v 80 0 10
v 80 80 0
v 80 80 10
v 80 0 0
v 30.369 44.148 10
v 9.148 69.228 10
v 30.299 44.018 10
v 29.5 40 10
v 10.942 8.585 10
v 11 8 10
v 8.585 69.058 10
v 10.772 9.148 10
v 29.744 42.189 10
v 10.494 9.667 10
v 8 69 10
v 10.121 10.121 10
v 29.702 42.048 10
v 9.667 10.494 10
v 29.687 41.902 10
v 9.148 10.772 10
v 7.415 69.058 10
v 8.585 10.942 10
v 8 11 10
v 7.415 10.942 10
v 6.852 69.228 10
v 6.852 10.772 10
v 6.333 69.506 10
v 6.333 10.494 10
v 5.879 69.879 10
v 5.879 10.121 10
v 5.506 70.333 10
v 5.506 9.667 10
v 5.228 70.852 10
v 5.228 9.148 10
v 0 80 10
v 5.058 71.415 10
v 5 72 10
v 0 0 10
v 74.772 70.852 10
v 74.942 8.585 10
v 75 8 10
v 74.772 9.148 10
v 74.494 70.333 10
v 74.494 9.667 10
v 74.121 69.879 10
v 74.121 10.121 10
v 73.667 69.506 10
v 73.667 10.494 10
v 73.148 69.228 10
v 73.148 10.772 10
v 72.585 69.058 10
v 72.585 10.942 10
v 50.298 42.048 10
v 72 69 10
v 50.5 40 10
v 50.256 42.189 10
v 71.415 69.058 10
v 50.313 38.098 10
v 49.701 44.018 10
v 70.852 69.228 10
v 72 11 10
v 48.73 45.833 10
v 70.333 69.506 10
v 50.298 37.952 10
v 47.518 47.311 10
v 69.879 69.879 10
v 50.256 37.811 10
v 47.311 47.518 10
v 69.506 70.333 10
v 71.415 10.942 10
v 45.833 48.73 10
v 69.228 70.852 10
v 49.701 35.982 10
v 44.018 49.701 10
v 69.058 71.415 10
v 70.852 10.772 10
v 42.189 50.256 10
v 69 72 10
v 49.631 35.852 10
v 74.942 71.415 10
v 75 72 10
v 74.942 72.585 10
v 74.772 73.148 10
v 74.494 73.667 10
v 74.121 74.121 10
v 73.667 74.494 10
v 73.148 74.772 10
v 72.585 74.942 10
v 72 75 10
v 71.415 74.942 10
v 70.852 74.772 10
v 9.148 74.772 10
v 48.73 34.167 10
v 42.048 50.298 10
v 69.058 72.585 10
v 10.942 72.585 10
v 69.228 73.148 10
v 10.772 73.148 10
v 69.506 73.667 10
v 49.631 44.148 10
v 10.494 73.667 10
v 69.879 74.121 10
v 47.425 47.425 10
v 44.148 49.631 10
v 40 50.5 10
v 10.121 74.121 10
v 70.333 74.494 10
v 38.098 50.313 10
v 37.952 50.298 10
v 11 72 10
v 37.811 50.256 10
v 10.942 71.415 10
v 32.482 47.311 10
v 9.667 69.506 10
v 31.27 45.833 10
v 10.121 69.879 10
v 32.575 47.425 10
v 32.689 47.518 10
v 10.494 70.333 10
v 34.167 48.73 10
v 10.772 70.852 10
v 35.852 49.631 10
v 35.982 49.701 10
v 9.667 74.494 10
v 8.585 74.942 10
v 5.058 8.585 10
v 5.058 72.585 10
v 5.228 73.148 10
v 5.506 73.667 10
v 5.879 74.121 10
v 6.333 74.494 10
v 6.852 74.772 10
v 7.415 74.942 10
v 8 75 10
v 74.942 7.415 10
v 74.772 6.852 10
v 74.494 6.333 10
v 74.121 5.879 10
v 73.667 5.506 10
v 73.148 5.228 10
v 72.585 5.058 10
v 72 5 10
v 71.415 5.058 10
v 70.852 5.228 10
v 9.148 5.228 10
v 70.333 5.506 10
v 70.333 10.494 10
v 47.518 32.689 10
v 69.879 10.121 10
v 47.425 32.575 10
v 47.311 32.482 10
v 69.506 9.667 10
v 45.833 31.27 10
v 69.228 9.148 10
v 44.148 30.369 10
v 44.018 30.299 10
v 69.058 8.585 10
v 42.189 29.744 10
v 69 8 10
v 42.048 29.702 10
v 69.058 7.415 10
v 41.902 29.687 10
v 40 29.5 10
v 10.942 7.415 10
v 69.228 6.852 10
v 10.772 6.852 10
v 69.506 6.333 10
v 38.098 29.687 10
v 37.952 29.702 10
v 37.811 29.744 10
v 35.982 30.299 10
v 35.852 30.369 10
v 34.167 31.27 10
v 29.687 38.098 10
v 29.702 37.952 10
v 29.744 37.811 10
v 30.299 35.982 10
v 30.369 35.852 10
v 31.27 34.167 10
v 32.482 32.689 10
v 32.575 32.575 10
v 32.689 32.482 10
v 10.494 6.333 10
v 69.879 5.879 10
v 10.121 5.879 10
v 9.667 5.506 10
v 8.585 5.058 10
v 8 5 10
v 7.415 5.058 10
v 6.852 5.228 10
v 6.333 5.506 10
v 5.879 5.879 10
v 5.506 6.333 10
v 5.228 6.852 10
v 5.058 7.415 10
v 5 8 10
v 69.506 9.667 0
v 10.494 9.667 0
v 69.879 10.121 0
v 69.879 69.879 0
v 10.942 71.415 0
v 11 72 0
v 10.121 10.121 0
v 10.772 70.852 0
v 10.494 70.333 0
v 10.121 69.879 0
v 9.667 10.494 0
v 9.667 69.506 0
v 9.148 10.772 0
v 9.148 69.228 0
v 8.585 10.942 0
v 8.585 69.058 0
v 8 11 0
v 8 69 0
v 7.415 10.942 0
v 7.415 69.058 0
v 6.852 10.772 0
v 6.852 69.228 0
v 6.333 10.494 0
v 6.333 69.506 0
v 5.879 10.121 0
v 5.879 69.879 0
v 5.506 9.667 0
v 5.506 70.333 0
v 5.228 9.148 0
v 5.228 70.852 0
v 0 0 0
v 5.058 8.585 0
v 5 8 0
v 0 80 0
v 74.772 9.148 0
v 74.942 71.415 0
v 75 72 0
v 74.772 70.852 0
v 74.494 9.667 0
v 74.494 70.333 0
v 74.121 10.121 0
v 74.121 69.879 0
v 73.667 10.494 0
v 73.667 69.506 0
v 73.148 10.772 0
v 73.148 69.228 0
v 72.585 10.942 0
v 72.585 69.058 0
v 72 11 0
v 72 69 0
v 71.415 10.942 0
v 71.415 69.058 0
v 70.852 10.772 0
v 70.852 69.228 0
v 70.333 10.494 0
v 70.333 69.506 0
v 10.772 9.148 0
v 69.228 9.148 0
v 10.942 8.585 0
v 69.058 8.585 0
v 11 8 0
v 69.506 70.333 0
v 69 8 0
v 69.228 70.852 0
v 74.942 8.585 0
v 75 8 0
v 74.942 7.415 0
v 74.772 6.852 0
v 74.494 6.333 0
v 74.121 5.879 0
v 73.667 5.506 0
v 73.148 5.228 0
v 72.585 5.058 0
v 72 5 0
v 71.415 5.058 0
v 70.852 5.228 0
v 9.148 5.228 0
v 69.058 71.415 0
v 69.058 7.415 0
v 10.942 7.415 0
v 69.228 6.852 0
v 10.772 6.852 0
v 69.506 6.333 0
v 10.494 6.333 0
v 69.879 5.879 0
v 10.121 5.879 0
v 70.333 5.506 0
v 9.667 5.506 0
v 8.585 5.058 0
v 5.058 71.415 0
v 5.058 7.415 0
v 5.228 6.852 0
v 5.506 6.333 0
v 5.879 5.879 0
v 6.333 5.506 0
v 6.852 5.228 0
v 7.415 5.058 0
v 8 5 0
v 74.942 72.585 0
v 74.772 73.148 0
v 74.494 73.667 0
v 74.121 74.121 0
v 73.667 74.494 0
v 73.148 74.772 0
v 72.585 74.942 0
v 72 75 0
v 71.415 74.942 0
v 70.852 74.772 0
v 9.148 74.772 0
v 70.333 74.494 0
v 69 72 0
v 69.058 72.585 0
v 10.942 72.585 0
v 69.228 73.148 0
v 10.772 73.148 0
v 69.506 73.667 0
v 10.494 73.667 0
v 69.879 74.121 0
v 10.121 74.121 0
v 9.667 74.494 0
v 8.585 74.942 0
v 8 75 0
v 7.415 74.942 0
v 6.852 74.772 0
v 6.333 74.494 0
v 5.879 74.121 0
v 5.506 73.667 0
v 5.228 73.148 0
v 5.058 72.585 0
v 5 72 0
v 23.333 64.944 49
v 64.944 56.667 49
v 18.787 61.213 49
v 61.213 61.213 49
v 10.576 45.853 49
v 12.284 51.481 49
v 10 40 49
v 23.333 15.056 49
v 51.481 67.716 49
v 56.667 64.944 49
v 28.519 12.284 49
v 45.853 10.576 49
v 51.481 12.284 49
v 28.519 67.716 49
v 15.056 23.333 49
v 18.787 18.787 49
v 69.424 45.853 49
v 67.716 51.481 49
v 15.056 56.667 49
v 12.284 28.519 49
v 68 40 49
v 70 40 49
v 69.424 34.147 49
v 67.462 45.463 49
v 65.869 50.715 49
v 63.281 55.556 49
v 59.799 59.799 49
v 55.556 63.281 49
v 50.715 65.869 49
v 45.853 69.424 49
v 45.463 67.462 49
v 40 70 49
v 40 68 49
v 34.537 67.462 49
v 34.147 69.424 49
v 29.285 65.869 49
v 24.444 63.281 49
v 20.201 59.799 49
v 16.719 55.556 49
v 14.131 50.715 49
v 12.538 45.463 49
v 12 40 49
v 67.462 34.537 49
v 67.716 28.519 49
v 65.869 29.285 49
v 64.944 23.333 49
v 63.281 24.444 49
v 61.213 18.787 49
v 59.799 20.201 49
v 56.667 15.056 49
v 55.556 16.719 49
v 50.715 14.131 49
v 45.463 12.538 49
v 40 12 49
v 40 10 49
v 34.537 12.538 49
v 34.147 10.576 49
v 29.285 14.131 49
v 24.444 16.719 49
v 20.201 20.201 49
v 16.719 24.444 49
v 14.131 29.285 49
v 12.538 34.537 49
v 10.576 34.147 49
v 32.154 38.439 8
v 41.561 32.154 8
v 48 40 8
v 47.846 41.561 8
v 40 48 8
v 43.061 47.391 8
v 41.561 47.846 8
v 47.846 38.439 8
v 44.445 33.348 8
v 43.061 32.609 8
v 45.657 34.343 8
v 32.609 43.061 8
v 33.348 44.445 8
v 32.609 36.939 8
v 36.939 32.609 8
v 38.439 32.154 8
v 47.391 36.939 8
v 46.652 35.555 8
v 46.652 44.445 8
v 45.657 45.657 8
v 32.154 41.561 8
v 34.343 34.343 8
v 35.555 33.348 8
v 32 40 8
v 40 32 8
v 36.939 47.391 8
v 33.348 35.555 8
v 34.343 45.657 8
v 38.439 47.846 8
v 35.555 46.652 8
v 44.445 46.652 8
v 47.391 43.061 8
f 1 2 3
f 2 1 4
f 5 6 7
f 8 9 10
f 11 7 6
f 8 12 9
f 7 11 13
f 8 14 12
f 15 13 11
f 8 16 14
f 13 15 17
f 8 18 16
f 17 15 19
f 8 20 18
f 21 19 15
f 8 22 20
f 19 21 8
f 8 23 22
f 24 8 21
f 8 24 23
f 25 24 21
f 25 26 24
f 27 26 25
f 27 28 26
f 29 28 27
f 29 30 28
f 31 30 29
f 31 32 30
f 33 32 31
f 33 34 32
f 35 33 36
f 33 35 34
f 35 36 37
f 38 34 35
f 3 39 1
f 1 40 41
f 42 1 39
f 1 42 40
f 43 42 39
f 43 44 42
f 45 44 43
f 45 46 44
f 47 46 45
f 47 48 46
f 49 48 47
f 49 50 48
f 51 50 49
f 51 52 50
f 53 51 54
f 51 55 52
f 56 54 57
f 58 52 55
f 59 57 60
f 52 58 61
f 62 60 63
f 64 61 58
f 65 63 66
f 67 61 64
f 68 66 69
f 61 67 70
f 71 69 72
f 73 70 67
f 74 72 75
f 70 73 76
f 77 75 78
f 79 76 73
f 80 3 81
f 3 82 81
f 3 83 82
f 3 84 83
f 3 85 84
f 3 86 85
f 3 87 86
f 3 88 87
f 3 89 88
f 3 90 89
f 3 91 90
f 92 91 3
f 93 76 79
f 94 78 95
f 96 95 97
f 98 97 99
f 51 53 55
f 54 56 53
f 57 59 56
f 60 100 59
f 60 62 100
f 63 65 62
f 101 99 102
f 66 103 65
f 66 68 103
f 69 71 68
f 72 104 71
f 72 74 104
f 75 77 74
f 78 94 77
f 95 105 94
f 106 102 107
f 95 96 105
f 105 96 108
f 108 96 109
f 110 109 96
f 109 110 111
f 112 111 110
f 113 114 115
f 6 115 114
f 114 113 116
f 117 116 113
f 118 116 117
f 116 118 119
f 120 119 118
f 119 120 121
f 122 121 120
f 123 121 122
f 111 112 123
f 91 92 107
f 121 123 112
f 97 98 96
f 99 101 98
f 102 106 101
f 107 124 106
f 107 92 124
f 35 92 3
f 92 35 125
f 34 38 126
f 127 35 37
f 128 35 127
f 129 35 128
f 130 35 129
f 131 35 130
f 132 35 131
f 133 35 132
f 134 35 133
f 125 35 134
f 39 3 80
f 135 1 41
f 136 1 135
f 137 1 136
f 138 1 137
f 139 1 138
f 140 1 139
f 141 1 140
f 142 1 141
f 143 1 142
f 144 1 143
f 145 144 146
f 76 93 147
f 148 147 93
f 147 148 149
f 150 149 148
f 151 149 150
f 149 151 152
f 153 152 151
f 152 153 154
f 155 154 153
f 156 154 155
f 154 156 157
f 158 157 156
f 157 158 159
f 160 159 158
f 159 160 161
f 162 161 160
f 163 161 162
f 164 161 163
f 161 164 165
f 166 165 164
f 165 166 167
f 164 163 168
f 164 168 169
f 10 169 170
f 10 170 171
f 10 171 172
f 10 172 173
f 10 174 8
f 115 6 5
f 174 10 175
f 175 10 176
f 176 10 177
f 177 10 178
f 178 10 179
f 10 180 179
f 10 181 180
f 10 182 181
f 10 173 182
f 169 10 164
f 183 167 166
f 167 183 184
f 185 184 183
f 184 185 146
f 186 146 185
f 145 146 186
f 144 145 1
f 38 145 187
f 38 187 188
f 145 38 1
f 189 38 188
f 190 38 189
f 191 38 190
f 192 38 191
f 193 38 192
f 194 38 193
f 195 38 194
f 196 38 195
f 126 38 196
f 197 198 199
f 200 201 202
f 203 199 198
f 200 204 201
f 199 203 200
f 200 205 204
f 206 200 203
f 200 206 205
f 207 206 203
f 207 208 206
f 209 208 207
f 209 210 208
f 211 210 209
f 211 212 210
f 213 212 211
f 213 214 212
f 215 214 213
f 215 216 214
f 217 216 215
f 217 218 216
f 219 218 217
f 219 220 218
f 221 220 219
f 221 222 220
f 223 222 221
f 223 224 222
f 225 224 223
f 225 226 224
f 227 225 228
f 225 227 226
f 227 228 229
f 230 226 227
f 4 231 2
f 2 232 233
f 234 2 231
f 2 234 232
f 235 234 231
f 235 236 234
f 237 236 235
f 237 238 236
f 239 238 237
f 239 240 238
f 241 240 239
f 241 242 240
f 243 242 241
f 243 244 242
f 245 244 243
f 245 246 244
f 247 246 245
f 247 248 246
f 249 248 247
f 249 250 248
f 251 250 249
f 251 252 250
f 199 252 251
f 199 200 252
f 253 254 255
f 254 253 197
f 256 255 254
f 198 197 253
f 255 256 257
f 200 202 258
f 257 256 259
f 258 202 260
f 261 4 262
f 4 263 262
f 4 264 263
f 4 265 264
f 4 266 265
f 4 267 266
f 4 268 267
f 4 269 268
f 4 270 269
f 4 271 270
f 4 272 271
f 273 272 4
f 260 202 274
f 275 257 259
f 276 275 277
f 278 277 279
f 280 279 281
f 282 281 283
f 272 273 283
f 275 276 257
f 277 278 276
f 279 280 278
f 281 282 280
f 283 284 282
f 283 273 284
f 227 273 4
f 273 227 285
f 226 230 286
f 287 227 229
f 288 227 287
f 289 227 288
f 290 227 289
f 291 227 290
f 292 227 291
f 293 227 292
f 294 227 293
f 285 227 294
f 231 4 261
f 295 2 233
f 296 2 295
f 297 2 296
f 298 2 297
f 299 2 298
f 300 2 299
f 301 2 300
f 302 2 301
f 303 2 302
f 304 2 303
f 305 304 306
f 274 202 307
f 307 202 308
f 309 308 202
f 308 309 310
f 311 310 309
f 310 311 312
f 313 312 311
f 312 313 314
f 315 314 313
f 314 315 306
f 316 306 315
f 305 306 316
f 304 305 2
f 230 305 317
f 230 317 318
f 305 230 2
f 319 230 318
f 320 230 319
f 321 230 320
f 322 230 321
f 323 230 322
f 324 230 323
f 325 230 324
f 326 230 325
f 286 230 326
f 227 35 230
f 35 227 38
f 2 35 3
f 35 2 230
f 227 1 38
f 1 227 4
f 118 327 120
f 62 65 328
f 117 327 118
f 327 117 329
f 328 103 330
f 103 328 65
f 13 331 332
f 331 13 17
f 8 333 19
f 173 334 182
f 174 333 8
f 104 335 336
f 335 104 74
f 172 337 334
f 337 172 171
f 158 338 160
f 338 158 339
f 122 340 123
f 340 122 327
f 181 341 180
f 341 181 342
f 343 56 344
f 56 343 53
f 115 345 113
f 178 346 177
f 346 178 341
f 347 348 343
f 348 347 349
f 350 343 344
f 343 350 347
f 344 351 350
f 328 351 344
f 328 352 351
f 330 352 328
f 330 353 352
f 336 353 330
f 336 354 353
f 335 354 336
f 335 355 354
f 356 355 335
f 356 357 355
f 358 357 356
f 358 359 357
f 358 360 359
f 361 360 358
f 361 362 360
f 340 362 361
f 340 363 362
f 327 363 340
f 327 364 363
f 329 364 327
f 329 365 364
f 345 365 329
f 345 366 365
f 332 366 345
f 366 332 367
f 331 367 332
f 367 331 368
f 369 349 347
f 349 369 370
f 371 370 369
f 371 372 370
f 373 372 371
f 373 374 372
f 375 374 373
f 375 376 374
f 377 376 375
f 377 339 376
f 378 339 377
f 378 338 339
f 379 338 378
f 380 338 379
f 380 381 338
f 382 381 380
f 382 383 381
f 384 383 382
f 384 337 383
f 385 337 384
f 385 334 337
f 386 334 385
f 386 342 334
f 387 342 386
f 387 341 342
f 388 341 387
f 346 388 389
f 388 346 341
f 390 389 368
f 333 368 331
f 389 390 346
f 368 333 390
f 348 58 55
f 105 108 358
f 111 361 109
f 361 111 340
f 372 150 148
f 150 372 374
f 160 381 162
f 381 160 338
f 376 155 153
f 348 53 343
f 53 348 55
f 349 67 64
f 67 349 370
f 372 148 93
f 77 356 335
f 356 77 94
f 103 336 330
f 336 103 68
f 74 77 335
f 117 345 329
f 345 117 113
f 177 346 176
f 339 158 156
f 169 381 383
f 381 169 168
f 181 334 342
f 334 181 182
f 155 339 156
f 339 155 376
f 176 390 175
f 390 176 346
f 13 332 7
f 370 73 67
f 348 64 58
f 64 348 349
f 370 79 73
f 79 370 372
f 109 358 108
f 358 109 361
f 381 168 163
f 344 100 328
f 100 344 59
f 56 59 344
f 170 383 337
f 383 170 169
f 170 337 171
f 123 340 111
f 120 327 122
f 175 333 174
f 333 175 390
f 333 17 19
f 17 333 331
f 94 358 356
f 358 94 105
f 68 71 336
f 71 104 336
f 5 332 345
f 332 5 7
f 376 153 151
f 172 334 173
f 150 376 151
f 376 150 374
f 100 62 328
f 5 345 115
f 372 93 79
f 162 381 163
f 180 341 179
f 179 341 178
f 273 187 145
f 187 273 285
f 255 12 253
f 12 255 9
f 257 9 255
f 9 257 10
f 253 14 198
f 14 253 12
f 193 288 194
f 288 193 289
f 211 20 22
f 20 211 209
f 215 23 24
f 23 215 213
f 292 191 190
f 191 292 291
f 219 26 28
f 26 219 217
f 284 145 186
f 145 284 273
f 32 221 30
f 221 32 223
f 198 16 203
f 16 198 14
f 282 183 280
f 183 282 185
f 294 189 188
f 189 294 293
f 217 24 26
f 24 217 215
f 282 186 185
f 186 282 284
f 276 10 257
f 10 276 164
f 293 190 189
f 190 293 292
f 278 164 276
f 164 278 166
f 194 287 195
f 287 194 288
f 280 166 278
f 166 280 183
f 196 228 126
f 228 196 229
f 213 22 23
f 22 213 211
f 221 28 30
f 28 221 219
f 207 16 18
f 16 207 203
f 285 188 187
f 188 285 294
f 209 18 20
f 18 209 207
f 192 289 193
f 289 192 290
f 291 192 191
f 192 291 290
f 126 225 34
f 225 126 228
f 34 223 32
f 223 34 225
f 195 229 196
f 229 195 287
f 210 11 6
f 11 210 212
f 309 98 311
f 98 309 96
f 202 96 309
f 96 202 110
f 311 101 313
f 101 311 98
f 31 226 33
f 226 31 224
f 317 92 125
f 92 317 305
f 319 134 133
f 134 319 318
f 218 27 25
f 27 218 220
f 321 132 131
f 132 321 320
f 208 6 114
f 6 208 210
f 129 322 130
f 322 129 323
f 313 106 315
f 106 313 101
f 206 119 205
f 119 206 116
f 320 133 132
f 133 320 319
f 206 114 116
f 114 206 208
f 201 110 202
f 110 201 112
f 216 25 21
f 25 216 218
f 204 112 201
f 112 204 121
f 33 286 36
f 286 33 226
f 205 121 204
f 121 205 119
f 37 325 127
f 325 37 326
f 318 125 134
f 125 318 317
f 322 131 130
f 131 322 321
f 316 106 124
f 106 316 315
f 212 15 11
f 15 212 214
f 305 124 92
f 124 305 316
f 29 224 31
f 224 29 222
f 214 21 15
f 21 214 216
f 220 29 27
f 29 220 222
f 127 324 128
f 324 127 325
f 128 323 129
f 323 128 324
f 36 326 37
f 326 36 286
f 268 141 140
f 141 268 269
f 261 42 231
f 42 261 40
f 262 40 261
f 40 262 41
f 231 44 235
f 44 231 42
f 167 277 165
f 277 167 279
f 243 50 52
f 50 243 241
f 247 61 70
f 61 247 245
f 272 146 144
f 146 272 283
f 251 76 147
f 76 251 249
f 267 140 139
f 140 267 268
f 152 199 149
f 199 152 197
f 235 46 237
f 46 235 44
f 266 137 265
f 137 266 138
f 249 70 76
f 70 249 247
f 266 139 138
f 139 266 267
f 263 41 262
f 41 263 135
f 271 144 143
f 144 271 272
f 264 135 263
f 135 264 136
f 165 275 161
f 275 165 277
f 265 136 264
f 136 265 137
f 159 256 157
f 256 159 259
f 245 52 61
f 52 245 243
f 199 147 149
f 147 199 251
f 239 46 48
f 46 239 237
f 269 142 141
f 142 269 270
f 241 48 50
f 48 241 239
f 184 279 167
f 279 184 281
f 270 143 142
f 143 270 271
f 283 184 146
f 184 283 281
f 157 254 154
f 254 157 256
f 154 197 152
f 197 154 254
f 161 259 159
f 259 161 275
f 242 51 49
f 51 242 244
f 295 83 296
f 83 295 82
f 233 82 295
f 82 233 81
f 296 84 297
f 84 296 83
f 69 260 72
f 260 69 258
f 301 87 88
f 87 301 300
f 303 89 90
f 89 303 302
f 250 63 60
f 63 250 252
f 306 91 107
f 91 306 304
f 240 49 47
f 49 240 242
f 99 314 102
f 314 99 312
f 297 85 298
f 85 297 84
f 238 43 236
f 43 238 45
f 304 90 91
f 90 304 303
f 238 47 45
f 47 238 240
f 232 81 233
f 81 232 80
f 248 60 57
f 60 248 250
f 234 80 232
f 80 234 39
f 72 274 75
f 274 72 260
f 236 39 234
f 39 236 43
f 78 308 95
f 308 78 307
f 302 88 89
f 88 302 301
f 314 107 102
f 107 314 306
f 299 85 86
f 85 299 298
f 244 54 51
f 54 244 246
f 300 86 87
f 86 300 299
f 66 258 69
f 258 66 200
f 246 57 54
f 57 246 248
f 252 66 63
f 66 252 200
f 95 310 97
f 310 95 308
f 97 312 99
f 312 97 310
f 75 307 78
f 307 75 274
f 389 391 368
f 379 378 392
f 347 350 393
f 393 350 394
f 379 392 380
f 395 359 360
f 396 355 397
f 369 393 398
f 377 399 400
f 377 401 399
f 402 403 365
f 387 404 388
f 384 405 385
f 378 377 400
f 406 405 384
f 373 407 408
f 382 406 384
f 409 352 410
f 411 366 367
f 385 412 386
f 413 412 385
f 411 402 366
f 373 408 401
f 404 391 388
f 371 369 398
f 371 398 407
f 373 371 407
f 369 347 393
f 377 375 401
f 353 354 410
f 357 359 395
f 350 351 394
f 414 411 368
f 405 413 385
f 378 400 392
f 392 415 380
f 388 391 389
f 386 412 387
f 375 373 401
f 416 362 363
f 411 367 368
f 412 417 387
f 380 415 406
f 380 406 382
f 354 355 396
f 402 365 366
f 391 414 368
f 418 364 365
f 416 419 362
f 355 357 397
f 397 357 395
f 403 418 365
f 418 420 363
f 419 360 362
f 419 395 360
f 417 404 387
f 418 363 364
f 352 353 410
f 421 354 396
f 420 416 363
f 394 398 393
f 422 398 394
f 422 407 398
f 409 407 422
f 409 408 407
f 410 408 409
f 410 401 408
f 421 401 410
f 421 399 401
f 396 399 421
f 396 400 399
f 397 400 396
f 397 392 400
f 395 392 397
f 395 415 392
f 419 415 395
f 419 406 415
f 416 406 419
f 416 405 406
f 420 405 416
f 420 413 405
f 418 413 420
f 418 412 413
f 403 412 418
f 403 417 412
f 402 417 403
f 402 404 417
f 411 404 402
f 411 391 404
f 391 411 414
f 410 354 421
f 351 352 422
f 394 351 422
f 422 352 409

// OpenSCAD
$fn = 32;

// ----------------------------------------------------------------------
// Hopper: flanged with square flange
// ----------------------------------------------------------------------

// --- parameters (mm) ---
fl = 80;                  // flange side, X and Y
fl_t = 10;                // flange thickness
cone_h = 40;              // cone height above the flange
top_d = 60;               // cone mouth diameter
bot_d = 20;               // cone spout diameter
wall = 2;                 // cone wall thickness
hole_r = 3;               // flange hole radius
hole_in = 8;              // hole inset from the corners
fit_tol = 0.1;            // tolerance for press fits, mm
free_tol = 0.5;           // tolerance for clearance fits, mm

bore_d = bot_d - 2 * wall;  // spout bore diameter
total_h = fl_t + cone_h - 1;  // overall height

difference() {
  union() {
    cube([fl, fl, fl_t]);
    translate([fl / 2, fl / 2, fl_t - 1])
      cylinder(h = cone_h, d1 = bot_d, d2 = top_d);
  }
  translate([fl / 2, fl / 2, fl_t - 2])
    cylinder(h = cone_h + 1, d1 = bore_d, d2 = top_d - 2 * wall);
  for (sx = [0, 1], sy = [0, 1])
    translate([sx ? fl - hole_in : hole_in,
               sy ? fl - hole_in : hole_in, -1])
      cylinder(r = hole_r, h = fl_t + 2);
}
